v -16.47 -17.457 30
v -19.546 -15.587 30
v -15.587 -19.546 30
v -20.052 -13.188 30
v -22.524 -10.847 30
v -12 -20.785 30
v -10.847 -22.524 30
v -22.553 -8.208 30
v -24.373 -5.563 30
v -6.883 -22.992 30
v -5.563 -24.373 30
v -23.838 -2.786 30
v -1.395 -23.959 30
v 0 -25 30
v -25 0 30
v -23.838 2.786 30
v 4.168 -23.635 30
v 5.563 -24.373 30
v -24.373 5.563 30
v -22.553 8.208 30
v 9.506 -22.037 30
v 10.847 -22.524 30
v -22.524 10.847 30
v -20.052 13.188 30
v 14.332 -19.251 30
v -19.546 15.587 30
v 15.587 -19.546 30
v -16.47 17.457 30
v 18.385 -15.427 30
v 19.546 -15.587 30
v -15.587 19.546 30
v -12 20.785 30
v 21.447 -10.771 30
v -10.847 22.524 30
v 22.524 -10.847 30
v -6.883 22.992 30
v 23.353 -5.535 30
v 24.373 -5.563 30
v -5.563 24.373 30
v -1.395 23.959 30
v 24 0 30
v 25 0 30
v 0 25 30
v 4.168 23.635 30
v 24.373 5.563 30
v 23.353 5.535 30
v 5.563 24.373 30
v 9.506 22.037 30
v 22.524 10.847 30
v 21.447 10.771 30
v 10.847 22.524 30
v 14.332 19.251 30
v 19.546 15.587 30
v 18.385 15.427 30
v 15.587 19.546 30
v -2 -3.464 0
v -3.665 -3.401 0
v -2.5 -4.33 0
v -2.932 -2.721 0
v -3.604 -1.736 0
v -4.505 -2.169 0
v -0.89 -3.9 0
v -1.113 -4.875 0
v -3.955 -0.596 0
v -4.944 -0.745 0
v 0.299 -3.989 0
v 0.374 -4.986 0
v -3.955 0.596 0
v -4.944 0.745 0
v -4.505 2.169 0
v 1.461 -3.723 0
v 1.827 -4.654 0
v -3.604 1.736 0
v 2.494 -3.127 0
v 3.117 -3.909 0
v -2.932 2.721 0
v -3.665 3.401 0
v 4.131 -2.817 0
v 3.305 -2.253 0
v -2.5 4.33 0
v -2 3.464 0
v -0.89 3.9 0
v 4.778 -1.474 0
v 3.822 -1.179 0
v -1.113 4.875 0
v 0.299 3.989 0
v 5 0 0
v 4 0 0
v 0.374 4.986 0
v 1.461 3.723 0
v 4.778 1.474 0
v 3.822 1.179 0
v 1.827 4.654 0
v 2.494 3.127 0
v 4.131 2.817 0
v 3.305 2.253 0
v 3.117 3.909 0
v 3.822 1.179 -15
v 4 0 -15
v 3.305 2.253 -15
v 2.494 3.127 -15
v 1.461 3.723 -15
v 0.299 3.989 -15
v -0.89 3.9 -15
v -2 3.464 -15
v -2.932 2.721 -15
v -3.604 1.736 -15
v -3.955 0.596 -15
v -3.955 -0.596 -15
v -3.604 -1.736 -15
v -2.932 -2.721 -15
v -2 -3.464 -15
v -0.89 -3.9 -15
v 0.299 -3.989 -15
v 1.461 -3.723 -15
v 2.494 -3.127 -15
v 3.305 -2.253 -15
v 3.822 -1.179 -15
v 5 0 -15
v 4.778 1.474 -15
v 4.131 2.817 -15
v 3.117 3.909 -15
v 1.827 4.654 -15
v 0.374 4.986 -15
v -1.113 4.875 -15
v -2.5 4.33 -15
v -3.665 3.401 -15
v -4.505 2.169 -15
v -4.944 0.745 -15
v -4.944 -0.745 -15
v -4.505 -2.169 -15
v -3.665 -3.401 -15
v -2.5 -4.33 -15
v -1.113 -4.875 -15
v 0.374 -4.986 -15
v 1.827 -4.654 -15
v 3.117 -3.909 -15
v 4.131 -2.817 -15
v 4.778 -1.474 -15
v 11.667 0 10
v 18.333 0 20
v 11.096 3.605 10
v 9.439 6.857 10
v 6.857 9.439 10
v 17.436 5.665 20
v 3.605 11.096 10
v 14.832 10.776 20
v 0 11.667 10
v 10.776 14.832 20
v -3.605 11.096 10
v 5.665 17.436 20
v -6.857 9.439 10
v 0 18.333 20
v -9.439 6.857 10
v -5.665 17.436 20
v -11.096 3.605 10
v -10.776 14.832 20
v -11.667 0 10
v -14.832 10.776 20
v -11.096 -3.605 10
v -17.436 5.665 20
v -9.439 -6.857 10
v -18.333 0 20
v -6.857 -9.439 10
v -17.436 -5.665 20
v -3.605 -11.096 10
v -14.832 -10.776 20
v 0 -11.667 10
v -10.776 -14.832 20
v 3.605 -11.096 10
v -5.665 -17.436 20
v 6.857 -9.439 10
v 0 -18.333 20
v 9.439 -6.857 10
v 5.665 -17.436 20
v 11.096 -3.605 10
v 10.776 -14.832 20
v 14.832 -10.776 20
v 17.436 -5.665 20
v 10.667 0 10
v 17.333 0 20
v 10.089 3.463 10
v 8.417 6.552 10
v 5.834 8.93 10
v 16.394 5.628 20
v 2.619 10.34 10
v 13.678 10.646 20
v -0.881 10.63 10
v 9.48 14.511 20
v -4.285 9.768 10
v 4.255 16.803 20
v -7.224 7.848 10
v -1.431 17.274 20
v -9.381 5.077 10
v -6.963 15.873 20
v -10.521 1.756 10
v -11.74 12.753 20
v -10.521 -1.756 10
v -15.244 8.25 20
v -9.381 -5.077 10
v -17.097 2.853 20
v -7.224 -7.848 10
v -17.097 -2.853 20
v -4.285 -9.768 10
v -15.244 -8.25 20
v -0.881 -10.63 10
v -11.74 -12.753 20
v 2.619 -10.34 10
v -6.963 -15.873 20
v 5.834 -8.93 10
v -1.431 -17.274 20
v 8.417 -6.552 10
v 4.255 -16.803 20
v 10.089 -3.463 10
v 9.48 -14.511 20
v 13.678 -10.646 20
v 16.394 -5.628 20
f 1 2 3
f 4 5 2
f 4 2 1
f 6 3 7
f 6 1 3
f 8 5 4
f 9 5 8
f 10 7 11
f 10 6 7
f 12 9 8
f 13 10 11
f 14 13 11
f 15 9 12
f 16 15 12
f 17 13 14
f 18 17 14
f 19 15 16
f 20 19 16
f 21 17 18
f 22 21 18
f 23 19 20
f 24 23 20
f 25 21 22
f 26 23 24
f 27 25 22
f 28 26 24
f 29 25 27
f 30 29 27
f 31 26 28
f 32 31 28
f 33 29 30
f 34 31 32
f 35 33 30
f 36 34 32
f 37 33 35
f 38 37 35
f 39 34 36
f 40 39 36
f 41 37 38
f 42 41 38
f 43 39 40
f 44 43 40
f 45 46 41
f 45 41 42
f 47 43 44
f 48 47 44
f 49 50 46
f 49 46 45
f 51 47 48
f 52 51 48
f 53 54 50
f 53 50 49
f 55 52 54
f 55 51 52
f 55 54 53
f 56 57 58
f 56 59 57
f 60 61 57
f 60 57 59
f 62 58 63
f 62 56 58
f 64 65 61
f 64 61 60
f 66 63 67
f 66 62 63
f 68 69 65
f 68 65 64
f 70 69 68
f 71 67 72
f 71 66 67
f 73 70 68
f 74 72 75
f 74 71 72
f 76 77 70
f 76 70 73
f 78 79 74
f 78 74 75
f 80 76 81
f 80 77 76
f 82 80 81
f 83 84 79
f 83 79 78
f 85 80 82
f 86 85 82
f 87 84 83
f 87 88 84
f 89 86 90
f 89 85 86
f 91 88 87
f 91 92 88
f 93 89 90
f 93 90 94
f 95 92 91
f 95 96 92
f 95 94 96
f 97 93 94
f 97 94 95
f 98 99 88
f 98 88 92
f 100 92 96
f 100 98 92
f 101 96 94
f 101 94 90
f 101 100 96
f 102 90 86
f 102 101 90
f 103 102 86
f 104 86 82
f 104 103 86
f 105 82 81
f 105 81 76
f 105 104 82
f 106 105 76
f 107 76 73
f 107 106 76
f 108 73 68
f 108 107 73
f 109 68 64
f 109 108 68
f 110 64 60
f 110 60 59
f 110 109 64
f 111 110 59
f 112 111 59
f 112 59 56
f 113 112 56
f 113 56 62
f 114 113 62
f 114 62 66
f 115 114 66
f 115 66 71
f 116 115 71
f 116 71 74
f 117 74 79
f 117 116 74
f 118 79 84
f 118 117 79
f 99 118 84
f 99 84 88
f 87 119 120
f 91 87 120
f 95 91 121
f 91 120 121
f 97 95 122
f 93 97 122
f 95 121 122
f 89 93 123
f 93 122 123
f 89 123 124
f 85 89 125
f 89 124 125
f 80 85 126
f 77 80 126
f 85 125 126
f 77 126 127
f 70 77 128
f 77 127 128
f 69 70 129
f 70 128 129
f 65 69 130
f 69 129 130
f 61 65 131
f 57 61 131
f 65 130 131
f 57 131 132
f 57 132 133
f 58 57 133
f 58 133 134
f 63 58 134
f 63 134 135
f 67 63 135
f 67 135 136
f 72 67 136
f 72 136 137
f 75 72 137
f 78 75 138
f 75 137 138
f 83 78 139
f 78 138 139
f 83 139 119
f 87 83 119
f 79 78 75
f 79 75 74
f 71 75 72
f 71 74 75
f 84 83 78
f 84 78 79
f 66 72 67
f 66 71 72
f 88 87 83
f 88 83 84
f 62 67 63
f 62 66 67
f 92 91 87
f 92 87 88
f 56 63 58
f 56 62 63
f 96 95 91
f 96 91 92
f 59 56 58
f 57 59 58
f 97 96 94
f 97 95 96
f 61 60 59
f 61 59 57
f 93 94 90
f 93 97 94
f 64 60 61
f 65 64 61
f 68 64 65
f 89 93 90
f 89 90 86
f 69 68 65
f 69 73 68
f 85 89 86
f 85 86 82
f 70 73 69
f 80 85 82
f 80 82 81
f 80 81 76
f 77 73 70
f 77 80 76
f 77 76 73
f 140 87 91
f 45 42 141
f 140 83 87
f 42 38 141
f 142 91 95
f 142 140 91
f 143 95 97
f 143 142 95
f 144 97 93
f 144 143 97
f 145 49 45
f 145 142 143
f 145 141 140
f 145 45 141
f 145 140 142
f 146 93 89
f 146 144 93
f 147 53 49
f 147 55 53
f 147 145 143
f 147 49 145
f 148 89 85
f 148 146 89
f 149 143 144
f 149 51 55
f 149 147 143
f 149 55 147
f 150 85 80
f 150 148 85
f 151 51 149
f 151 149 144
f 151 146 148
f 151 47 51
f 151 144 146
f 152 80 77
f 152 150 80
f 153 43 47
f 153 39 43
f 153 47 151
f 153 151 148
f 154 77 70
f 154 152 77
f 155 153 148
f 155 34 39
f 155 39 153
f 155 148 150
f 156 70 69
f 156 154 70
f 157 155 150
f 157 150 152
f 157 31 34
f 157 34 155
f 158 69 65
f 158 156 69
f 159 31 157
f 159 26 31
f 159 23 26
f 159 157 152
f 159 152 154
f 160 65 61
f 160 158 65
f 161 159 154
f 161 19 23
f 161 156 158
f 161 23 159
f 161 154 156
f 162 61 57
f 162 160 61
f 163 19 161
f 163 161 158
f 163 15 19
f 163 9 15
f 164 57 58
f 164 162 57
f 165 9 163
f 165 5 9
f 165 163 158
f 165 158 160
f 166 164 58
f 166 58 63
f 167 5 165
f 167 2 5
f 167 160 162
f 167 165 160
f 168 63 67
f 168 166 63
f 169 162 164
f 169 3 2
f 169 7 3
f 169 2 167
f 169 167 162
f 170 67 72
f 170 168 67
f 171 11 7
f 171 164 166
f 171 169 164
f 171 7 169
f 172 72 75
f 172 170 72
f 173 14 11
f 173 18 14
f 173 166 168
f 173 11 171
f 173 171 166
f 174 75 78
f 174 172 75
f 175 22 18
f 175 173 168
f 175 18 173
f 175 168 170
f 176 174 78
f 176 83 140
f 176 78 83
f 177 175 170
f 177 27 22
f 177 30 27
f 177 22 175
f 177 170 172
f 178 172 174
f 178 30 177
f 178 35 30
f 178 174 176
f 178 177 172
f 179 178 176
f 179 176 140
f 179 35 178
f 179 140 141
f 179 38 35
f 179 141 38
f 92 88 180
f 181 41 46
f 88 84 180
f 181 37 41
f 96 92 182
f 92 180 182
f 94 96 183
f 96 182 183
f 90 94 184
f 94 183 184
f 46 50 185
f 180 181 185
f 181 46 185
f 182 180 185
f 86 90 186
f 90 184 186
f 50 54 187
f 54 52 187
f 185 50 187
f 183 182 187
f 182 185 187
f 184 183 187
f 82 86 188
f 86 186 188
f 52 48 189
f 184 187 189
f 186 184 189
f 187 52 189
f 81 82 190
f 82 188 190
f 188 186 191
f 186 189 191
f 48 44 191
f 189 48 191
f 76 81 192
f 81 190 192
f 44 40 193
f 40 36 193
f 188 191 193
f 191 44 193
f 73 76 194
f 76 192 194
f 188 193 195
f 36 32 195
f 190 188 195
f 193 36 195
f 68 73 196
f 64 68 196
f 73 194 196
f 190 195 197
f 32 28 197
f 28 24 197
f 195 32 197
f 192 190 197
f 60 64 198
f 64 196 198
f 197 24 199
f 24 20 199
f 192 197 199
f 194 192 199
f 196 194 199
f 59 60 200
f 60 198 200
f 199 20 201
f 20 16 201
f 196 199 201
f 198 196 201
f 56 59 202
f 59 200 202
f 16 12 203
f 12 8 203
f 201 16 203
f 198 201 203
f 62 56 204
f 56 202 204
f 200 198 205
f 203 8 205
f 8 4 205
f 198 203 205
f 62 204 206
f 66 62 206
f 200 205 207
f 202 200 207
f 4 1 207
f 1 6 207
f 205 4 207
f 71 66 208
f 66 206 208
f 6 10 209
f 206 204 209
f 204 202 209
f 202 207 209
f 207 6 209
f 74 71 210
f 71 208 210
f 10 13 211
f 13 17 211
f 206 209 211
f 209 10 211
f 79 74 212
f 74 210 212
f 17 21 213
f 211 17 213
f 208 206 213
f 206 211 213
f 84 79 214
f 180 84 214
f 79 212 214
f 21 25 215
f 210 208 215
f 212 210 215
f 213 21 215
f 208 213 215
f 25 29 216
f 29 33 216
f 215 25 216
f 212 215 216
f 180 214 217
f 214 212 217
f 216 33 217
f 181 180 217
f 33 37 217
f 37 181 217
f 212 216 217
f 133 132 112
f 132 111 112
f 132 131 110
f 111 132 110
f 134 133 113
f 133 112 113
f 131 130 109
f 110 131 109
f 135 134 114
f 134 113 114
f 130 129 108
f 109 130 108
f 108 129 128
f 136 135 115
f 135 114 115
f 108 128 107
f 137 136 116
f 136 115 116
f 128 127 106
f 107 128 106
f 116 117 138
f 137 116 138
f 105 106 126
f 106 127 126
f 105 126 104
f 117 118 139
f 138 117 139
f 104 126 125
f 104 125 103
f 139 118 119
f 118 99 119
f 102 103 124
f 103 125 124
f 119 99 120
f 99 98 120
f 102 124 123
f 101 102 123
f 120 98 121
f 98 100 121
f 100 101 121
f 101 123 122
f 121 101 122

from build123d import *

# Parameters (mm, degrees)
CYLINDER001_R     = 4
CYLINDER001_DEPTH = 15
CYLINDER_R        = 5
CYLINDER_DEPTH    = 15


with BuildPart() as con001:
    # Cone001 → Cone001 (revolve)
    with BuildSketch(Plane.XZ):
        Polygon((0, 0), (4, 0), (24, 30), (0, 30), align=None)
    revolve(axis=Axis((0, 0, 0), (0, 0, 1)))


with BuildPart() as cut:
    # Cone → Cone (revolve)
    with BuildSketch(Plane.XZ):
        Polygon((0, 0), (5, 0), (25, 30), (0, 30), align=None)
    revolve(axis=Axis((0, 0, 0), (0, 0, 1)))

    # Cut: cut Con001
    add(con001.part, mode=Mode.SUBTRACT)


with BuildPart() as cilindre001:
    # Cylinder001 → Cylinder001 (new body)
    with BuildSketch(Plane.XY.offset(-15)):
        Circle(CYLINDER001_R)
    extrude(amount=CYLINDER001_DEPTH)


with BuildPart() as cut001:
    # Cylinder → Cylinder (new body)
    with BuildSketch(Plane.XY.offset(-15)):
        Circle(CYLINDER_R)
    extrude(amount=CYLINDER_DEPTH)

    # Cut001: cut Cilindre001
    add(cilindre001.part, mode=Mode.SUBTRACT)


solid = Compound([cut.part, cut001.part])
